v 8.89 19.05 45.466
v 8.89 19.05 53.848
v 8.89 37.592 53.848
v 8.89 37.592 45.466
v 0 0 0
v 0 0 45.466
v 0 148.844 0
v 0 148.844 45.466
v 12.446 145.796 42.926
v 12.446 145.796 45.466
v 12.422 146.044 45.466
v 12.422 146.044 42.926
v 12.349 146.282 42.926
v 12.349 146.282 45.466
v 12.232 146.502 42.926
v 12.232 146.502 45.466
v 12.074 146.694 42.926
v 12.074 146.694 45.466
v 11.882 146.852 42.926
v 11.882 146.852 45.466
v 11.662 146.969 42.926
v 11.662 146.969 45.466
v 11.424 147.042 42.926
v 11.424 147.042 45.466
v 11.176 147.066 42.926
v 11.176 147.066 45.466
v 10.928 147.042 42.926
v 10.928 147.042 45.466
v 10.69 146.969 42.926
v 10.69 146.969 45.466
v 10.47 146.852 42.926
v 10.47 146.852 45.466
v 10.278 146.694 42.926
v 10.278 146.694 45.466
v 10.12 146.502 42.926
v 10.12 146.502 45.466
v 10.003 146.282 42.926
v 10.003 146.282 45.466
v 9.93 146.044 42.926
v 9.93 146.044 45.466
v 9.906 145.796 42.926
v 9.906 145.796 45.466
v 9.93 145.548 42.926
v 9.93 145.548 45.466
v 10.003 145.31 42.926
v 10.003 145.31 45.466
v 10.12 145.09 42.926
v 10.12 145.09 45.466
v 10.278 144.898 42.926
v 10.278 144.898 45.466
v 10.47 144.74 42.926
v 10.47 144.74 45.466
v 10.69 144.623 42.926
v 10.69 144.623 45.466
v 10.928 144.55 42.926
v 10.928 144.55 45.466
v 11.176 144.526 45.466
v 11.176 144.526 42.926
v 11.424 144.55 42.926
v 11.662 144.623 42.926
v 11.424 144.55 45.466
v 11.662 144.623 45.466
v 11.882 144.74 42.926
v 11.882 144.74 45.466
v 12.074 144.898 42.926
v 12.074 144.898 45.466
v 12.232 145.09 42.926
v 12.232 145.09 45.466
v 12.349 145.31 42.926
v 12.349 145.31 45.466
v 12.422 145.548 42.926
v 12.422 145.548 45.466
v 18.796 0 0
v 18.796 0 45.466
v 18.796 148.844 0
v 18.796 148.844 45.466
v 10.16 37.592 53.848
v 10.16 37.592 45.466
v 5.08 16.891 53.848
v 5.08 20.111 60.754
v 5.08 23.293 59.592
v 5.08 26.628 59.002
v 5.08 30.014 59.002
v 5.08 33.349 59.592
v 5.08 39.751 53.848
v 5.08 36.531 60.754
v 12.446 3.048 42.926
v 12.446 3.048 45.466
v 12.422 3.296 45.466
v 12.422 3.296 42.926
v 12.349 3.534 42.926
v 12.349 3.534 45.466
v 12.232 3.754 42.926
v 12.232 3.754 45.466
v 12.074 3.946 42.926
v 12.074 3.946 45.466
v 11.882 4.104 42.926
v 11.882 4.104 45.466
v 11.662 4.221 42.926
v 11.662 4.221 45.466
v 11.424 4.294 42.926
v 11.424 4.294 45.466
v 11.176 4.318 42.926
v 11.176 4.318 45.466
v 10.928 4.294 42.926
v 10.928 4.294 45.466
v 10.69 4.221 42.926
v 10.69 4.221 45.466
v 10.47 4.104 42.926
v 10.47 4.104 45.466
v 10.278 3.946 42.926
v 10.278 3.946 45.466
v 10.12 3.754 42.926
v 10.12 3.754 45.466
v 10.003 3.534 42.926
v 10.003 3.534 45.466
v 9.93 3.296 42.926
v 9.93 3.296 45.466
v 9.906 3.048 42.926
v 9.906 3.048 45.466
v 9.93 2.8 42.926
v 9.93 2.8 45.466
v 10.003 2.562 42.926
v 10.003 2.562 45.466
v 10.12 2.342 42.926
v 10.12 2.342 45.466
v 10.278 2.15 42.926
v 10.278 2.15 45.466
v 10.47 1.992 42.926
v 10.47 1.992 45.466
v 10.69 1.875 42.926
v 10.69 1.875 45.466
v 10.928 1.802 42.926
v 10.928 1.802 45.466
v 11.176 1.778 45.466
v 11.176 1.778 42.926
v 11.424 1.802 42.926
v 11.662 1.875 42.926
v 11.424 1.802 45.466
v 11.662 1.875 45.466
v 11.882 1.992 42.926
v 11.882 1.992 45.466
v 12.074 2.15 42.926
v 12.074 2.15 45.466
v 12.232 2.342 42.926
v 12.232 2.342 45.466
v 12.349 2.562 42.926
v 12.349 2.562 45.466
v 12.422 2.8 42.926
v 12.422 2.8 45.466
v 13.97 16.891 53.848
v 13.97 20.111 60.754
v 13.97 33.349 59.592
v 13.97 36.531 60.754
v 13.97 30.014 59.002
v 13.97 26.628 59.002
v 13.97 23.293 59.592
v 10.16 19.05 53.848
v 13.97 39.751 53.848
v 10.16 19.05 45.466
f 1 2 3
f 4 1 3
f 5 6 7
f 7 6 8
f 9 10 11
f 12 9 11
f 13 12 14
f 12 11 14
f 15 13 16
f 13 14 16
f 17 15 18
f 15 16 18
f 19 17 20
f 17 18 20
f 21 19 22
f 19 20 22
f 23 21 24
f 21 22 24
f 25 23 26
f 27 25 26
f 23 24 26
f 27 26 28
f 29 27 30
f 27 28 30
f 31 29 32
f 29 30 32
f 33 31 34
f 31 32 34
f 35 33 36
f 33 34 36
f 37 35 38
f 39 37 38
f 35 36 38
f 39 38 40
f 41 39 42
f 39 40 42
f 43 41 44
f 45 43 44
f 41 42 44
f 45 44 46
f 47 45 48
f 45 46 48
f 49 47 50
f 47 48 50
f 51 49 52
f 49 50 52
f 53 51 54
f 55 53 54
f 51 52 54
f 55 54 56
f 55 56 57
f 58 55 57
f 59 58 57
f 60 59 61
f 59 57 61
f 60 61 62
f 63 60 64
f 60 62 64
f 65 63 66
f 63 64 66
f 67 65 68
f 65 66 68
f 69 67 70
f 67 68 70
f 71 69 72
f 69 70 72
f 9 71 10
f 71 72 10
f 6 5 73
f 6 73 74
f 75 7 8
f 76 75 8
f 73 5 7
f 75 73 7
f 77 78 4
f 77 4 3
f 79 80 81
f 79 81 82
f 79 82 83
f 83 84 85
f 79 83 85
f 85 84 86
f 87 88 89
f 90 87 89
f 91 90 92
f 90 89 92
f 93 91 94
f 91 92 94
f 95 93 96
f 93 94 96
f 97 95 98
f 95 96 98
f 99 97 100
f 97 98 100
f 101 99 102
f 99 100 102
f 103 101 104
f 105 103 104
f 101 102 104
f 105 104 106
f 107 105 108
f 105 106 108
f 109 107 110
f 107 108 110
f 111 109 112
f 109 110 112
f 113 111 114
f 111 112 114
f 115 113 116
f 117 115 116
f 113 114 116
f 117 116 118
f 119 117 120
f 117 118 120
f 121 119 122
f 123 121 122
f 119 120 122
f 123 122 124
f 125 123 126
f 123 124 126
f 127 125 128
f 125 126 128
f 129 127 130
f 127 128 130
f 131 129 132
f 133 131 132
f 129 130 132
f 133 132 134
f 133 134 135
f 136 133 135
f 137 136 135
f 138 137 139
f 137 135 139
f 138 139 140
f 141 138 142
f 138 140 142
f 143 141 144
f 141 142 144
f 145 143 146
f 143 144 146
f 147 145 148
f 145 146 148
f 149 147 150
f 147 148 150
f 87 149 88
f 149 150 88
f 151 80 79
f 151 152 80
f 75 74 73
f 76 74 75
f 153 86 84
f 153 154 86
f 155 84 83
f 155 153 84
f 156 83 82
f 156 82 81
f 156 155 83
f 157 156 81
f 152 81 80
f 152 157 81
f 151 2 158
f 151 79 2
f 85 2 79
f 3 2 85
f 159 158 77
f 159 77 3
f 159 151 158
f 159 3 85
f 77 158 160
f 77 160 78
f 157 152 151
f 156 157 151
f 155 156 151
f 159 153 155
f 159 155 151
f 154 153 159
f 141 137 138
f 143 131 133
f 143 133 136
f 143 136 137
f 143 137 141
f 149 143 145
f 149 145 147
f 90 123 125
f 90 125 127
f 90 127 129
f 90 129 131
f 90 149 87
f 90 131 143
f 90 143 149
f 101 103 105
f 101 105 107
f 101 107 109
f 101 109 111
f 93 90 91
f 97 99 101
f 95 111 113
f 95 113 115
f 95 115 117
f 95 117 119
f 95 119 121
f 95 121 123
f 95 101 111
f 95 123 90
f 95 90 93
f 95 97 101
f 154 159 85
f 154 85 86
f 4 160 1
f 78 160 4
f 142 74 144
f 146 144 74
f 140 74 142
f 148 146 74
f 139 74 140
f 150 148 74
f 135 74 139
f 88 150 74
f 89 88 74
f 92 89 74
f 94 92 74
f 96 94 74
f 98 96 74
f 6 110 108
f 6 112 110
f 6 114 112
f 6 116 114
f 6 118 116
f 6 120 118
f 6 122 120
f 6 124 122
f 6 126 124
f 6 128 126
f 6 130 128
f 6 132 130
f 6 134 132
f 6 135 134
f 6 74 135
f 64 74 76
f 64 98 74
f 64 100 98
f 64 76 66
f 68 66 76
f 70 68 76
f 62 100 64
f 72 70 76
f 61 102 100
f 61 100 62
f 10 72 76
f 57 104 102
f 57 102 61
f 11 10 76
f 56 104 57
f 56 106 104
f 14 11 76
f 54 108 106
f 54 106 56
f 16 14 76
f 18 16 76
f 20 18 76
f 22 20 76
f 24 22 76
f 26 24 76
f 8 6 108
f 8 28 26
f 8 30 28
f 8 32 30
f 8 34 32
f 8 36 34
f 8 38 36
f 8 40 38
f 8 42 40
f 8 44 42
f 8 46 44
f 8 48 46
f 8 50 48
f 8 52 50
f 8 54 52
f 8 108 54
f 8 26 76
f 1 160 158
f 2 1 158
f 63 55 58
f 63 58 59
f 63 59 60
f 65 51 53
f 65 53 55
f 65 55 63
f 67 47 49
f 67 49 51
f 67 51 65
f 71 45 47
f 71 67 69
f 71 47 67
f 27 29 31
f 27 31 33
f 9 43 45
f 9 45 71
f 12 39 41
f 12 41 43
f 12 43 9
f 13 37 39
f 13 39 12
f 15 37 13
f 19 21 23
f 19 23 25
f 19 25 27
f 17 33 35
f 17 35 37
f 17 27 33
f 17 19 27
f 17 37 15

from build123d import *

# Parameters (mm, degrees)
F0_W     = 148.844
F0_H     = 45.466
F1_DEPTH = 18.796
F2_R     = 1.27
F3_DEPTH = 2.54
F5_W     = 18.542
F5_H     = 8.382
F6_DEPTH = 0.635
F8_DEPTH = 4.445


with BuildPart() as f1:
    # F0 (on Right) → F1 (new body)
    with BuildSketch(Plane.YZ):
        with Locations((74.422, 22.733)):
            Rectangle(F0_W, F0_H)
    extrude(amount=F1_DEPTH)

    # F2 (on face) → F3 (cut)
    with BuildSketch(Plane.XY.offset(45.466)):
        with Locations((11.176, 145.796)):
            Circle(F2_R)
        with Locations((11.176, 3.048)):
            Circle(F2_R)
    extrude(amount=-F3_DEPTH, mode=Mode.SUBTRACT)


with BuildPart() as f6:
    # F5 (on offset) → F6 (new body, symmetric)
    with BuildSketch(Plane.YZ.offset(9.525)):
        with Locations((28.321, 49.657)):
            Rectangle(F5_W, F5_H)
    extrude(amount=F6_DEPTH, both=True)

    # F7 (on offset) → F8 (join, symmetric)
    with BuildSketch(Plane.YZ.offset(9.525)):
        with BuildLine():
            Line((20.111351, 60.754065), (16.891, 53.848))
            Line((16.891, 53.848), (39.751, 53.848))
            Line((39.751, 53.848), (36.530649, 60.754065))
            ThreePointArc((36.530649, 60.754065), (28.321, 58.928), (20.111351, 60.754065))
        make_face()
    extrude(amount=F8_DEPTH, both=True)


solid = Compound([f1.part, f6.part])
